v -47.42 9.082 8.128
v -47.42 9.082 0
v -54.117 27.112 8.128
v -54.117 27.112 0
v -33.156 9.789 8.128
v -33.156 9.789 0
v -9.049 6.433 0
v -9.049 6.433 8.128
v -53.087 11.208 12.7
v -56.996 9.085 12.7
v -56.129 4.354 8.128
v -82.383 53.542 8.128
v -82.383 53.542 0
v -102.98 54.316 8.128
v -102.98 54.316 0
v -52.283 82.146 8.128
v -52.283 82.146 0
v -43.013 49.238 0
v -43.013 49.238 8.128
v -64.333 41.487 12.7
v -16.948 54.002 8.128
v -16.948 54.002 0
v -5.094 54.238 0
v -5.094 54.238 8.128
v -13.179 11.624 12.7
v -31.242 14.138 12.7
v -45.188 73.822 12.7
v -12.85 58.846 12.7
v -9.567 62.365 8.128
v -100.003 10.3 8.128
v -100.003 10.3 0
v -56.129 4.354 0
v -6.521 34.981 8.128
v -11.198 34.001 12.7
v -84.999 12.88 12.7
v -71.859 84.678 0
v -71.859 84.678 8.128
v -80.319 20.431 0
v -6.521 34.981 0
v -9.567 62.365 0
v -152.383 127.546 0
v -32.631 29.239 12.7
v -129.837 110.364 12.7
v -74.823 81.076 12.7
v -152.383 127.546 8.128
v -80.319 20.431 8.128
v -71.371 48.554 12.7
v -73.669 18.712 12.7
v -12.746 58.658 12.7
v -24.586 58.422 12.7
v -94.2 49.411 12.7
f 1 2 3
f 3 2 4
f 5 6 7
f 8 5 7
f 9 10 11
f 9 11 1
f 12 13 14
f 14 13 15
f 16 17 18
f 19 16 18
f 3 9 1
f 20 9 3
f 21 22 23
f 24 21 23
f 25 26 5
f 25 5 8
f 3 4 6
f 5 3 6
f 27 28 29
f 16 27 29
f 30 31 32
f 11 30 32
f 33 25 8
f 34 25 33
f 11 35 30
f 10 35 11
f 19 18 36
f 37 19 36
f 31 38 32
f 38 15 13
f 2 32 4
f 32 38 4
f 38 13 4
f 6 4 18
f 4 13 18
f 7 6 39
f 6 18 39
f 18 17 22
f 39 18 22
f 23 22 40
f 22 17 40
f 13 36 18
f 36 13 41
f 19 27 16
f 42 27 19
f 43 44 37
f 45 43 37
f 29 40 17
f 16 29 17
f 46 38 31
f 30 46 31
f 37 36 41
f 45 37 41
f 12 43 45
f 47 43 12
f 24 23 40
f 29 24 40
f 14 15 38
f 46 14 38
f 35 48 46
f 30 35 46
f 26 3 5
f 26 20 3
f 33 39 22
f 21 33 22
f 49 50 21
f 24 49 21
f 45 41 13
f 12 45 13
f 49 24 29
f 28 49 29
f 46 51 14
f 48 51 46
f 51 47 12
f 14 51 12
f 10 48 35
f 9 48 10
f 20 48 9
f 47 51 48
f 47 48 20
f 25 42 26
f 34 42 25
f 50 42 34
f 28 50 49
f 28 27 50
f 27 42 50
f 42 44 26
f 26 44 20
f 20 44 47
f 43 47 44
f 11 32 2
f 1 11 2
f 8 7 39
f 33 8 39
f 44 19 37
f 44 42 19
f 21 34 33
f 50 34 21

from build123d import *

# Parameters (mm, degrees)
F1_DEPTH = 12.7
F2_SIZE  = 4.572


# Not quite as in the source:
# - a feature names something its author has since deleted; it is built from what else it names


with BuildPart() as f1:
    # F0 (on Top) → F1 (new body)
    with BuildSketch(Plane.XY):
        Polygon((-47.4197901785, 9.0821487829), (-54.1167072952, 27.1118637174), (-33.1560820341, 9.7886463627), (-9.0490672737, 6.4328033477), (-6.5208841115, 34.9811986089), (-16.9482622296, 54.0015585721), (-5.0941226073, 54.2380437255), (-9.5673697069, 62.3648315668), (-52.2826313972, 82.1464285254), (-43.0134832859, 49.2380969226), (-71.8594374871, 84.6780897401), (-152.3833320228, 127.5459273348), (-82.3831111193, 53.5424649715), (-102.9803976417, 54.3163046241), (-80.3189948201, 20.4314347357), (-100.0030711293, 10.3000625968), (-56.1285279691, 4.3535600416), align=None)
    extrude(amount=F1_DEPTH)

    # F2
    f2_edges = [f1.edges().sort_by_distance(p)[0] for p in [
        (-30.925001, 72.25563, 12.7),
        (-47.648057, 65.692263, 12.7),
        (-57.43646, 66.958093, 12.7),
        (-112.121385, 106.112009, 12.7),
        (-117.383222, 90.544196, 12.7),
        (-92.681754, 53.929385, 12.7),
        (-91.649696, 37.37387, 12.7),
        (-90.161033, 15.365749, 12.7),
        (-78.0658, 7.326811, 12.7),
        (-51.774159, 6.717854, 12.7),
        (-50.768249, 18.097006, 12.7),
        (-43.636395, 18.450255, 12.7),
        (-21.102575, 8.110725, 12.7),
        (-7.784976, 20.707001, 12.7),
        (-11.734573, 44.491379, 12.7),
        (-11.021192, 54.119801, 12.7),
        (-7.330746, 58.301438, 12.7),
    ]]
    chamfer(f2_edges, length=F2_SIZE)


solid = f1.part
